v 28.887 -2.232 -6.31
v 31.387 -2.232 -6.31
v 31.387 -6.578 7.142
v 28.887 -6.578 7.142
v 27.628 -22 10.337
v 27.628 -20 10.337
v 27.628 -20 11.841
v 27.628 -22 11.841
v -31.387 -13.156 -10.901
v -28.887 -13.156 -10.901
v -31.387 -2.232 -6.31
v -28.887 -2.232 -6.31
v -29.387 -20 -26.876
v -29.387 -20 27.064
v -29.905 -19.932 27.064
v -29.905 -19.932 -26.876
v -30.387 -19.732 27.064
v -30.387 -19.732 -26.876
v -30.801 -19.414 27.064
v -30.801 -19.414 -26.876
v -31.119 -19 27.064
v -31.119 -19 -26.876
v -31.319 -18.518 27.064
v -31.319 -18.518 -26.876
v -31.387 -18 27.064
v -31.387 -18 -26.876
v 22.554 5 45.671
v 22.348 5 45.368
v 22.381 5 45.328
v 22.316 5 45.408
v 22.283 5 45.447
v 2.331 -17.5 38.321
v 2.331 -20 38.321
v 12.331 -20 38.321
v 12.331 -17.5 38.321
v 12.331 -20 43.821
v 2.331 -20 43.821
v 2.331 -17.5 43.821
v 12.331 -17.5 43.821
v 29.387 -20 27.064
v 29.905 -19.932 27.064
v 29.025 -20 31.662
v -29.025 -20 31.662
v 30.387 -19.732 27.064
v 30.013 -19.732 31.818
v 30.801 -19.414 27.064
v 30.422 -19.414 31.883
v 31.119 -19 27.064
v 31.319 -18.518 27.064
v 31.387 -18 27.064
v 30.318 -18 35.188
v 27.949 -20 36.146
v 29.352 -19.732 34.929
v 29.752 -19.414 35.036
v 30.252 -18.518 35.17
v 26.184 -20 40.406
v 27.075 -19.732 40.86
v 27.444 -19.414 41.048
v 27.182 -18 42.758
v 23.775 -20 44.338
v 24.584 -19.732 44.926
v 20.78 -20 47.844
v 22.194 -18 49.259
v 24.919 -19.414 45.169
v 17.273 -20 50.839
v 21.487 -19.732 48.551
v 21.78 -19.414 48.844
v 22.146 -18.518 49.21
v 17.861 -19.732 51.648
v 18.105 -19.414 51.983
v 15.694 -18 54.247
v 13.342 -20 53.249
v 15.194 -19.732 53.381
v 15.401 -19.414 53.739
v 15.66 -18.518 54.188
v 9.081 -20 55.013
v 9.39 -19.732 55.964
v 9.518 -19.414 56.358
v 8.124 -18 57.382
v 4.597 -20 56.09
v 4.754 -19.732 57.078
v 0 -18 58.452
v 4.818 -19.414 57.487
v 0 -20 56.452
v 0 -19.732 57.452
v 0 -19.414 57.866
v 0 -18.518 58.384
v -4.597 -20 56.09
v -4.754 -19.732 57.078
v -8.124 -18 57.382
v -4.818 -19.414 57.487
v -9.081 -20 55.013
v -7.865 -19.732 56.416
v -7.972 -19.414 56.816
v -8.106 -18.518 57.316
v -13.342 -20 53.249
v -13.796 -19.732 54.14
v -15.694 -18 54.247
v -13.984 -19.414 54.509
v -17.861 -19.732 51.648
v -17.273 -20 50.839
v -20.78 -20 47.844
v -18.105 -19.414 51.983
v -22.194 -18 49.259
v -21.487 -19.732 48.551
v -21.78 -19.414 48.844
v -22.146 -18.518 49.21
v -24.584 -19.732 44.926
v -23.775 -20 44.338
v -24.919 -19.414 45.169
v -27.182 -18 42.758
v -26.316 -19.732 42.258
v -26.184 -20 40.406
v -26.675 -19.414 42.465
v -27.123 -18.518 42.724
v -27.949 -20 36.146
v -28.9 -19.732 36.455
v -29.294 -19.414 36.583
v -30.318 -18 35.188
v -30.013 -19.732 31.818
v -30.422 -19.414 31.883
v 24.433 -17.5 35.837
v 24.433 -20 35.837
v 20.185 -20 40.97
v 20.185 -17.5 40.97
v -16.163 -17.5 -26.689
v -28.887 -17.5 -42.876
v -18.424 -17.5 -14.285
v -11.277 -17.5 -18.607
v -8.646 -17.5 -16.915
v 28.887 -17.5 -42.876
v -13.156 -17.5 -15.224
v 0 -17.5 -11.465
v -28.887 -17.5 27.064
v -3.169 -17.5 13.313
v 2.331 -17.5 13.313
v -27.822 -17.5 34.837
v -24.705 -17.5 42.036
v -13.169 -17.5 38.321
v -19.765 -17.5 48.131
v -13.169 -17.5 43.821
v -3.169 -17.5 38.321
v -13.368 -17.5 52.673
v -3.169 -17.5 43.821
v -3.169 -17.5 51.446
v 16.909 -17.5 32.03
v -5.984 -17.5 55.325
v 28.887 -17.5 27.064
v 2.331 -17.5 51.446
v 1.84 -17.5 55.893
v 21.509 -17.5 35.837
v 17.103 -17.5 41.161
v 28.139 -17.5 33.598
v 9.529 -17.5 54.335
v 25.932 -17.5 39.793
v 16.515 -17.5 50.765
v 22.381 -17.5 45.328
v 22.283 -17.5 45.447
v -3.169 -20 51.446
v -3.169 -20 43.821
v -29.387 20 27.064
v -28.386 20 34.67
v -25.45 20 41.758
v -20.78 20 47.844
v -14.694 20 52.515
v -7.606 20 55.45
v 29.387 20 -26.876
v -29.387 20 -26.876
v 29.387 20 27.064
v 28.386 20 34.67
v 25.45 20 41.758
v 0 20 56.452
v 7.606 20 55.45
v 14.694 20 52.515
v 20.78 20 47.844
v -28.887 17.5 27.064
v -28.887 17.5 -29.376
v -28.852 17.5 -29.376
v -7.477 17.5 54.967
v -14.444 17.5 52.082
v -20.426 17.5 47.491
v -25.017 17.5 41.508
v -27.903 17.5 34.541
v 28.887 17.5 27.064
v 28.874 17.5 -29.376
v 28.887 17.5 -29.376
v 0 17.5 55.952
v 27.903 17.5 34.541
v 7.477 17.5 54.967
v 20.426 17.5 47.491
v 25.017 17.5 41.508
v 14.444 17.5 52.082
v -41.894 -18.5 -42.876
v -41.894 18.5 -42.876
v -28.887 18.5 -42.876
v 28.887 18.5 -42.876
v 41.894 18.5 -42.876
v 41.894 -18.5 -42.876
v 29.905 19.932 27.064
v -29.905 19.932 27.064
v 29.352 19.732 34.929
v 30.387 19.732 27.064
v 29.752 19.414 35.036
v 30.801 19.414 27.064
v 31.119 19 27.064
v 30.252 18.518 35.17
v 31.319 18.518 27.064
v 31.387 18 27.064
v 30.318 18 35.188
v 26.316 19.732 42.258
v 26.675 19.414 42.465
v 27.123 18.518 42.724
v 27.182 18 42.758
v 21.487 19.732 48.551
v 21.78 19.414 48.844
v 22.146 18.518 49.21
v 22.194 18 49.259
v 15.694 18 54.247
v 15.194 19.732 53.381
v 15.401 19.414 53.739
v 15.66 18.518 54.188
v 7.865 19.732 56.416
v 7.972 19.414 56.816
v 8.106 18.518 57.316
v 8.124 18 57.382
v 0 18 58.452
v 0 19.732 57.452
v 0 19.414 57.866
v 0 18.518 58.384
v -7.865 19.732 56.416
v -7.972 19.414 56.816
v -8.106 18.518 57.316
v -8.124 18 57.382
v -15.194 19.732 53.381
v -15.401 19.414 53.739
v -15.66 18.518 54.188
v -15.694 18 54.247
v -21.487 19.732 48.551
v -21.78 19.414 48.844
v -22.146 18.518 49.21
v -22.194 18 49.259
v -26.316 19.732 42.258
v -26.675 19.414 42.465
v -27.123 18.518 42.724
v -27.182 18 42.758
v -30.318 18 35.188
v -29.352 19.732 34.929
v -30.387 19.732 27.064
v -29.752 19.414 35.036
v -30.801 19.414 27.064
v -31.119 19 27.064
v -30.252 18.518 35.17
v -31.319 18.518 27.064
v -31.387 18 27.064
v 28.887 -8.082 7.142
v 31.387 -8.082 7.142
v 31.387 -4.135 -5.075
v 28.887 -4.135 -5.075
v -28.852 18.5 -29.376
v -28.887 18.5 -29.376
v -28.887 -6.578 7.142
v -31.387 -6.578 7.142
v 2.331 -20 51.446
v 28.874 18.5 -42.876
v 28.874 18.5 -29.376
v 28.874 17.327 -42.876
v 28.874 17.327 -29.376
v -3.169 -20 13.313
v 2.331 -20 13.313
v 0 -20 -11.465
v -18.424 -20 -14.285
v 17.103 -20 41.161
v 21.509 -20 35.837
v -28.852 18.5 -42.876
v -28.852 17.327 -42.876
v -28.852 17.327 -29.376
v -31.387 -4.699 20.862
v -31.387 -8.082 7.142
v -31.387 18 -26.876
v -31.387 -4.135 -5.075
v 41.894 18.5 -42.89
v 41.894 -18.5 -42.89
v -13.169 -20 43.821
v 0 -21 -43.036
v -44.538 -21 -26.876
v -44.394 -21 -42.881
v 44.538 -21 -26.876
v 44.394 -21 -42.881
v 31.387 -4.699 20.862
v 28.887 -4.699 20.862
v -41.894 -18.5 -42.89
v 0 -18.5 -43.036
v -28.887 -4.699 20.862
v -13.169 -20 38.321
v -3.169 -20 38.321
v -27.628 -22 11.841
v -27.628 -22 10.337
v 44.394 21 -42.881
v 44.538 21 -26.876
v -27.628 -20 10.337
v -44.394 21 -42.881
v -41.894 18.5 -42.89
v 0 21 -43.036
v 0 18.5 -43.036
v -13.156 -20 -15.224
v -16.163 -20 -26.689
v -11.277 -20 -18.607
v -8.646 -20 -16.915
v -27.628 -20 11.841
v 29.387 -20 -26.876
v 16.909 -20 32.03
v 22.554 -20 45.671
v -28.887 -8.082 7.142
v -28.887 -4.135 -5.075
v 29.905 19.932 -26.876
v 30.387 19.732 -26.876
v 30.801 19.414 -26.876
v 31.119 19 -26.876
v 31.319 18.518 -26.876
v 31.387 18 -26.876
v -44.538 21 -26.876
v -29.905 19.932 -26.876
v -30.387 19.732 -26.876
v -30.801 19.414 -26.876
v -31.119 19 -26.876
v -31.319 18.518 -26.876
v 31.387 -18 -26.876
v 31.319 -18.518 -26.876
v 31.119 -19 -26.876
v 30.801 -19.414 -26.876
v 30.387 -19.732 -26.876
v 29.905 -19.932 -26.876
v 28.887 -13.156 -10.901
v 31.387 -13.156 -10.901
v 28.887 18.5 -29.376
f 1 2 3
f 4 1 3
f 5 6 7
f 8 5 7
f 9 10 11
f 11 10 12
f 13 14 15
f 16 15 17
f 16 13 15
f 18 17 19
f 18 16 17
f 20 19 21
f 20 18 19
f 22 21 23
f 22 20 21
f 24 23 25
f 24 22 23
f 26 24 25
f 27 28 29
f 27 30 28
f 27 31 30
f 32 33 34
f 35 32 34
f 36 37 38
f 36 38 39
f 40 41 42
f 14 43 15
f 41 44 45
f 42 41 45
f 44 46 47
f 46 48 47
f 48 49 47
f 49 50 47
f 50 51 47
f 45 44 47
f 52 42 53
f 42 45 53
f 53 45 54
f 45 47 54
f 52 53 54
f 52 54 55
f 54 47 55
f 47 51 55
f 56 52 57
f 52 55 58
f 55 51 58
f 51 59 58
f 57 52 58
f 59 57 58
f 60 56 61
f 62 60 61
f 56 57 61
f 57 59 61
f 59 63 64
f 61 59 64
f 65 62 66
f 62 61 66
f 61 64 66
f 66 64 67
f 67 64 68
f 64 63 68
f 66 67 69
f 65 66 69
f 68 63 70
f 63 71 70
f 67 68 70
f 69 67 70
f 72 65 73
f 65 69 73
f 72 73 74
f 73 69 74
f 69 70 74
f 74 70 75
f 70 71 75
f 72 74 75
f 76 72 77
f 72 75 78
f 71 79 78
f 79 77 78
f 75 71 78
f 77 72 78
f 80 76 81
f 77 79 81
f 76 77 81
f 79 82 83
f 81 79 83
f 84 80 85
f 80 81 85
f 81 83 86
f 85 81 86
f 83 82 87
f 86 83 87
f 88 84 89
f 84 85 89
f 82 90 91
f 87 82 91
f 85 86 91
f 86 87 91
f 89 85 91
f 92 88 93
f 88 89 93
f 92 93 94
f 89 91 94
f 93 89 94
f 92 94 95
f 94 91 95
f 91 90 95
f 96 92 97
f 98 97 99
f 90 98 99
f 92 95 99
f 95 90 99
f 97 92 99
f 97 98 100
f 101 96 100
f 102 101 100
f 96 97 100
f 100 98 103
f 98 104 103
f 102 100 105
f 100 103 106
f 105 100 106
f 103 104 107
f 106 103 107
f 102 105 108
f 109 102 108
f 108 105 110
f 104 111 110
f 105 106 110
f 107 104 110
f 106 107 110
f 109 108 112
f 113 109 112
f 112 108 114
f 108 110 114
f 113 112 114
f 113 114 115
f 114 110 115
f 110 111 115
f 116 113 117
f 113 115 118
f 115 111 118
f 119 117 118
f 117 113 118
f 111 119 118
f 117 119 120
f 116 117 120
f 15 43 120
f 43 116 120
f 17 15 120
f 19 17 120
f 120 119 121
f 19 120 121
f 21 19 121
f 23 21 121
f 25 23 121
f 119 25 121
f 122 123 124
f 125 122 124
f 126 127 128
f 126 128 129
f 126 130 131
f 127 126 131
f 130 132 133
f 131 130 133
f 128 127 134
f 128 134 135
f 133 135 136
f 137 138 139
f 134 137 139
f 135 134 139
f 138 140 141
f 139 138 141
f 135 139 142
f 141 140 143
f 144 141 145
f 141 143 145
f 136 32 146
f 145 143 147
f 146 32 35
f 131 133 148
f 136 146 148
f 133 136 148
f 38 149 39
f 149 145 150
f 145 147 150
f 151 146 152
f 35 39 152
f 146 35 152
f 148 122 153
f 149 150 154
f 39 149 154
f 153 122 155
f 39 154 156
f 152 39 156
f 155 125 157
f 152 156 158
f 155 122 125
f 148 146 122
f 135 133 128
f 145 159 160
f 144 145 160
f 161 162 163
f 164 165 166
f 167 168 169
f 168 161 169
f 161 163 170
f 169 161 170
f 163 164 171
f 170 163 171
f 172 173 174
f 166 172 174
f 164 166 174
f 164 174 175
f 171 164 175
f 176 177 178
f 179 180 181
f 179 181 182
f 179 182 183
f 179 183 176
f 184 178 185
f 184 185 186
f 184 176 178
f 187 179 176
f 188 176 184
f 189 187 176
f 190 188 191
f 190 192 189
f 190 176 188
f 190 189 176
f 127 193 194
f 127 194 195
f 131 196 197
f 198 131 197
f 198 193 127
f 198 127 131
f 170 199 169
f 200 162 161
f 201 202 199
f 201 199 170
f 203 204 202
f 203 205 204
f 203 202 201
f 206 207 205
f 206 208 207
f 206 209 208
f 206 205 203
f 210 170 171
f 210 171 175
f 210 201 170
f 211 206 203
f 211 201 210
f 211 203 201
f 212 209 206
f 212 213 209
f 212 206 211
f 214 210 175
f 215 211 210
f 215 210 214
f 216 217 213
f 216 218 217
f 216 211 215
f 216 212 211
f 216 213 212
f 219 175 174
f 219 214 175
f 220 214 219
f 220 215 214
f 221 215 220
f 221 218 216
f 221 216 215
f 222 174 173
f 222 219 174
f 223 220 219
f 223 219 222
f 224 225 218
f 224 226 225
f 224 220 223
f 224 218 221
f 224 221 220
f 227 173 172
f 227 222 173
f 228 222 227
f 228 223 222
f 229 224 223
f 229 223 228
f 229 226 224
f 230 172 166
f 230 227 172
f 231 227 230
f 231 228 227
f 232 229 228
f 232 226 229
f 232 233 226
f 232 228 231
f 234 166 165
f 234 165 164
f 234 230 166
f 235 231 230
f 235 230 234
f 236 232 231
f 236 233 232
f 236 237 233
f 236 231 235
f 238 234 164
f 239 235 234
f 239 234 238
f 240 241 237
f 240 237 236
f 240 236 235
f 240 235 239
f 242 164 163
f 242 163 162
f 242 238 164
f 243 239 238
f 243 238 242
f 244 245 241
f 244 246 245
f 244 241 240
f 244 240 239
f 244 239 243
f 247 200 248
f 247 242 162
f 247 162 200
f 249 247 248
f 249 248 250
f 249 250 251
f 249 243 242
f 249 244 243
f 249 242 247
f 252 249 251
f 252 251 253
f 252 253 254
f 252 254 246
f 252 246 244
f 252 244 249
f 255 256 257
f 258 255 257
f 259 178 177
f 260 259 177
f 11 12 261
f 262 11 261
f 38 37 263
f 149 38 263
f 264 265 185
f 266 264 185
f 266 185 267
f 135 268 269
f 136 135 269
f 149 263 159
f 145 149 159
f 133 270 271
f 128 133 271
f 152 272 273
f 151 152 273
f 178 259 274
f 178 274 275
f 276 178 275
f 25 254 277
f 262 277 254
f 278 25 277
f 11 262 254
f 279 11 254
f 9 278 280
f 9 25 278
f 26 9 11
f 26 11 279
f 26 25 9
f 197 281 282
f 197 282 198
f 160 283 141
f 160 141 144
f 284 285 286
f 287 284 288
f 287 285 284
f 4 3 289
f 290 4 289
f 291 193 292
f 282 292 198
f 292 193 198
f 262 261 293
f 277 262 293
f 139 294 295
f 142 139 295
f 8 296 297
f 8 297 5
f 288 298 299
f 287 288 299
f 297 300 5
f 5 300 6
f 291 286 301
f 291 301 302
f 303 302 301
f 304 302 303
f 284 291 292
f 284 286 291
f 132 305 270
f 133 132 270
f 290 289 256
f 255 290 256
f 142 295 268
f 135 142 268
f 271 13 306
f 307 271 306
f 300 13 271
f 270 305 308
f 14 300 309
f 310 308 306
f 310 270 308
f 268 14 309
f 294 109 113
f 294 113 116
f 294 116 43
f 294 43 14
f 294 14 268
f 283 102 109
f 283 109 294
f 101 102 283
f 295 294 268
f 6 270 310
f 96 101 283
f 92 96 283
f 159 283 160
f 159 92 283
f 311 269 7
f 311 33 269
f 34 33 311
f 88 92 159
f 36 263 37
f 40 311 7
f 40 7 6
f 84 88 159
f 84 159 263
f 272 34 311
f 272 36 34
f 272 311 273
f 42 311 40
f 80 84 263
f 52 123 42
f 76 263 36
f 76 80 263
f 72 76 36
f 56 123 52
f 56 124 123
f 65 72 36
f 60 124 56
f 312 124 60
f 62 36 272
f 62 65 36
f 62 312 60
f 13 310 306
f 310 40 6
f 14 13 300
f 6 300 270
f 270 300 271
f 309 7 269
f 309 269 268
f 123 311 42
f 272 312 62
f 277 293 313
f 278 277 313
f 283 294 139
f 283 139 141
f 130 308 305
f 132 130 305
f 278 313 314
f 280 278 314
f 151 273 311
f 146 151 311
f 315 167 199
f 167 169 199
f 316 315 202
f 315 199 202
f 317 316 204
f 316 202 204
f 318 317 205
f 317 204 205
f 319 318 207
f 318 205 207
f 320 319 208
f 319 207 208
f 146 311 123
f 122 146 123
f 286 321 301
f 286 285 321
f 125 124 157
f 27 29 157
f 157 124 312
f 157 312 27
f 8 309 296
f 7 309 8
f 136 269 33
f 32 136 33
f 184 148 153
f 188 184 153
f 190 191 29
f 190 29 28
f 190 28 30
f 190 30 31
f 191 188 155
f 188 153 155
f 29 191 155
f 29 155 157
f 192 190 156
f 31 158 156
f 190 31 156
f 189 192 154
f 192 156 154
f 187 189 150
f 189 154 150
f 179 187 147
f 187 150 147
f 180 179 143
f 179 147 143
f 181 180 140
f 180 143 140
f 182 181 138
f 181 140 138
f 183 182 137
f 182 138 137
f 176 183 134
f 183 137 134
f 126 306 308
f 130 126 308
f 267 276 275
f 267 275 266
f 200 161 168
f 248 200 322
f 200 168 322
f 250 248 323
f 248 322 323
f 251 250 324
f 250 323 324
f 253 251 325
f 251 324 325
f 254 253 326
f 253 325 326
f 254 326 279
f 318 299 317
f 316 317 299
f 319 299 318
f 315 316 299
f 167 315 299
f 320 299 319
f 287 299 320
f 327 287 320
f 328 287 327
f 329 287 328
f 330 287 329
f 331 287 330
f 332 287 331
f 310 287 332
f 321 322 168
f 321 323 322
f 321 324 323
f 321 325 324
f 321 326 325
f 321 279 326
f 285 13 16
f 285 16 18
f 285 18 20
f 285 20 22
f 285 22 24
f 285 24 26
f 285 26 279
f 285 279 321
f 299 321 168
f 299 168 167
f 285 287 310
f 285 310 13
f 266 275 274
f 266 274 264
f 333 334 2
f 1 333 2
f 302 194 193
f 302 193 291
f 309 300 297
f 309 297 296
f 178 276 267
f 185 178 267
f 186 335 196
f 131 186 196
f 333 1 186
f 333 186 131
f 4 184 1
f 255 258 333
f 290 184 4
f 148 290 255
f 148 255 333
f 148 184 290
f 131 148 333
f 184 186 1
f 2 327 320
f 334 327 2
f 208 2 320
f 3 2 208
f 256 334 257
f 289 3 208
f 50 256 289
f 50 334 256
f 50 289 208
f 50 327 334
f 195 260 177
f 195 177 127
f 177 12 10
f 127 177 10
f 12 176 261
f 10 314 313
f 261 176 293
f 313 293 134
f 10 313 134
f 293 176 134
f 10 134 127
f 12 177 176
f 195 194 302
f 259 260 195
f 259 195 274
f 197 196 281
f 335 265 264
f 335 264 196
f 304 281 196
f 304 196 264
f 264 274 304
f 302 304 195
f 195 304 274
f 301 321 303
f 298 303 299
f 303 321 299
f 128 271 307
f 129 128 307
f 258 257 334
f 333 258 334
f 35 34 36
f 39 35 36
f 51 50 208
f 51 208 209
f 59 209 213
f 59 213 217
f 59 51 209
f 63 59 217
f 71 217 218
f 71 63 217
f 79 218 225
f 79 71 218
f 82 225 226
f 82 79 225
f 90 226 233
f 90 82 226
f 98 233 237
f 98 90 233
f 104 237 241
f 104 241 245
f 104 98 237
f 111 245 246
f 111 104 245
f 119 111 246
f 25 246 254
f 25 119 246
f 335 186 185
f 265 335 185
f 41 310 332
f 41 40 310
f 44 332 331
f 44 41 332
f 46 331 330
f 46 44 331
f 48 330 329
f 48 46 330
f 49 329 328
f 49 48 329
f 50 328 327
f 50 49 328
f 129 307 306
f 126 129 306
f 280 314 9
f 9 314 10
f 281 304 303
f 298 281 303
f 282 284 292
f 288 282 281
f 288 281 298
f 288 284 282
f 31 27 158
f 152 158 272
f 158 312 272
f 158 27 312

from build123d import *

# Parameters (mm, degrees)
F1_DEPTH  = 20
F3_DEPTH  = 21
F4_T      = -2.5
F6_W      = 10
F6_H      = 5.5
F7_DEPTH  = 25
F8_W      = 55.2565678954
F8_H      = 1.5035793185
F9_DEPTH  = 2
F10_R     = 2
F12_DEPTH = 70
F14_DEPTH = 25
F16_DEPTH = 25
F17_W     = 13.128624599
F17_H     = 37
F18_DEPTH = 13.5
F19_W     = 13.128624711
F19_H     = 37
F20_DEPTH = 13.5
F21_W     = 57.774464488
F21_H     = 1
F21_W_2   = 57.7263757586
F21_H_2   = 1.2739617378
F22_DEPTH = 13.5


with BuildPart() as f1:
    # F0 (on Front) → F1 (new body, symmetric)
    with BuildSketch(Plane.XZ):
        with BuildLine():
            Line((31.387232244, -27.2523891181), (31.387232244, 27.0644389093))
            ThreePointArc((31.387232244, 27.0644389093), (0, 58.4516711533), (-31.387232244, 27.0644389093))
            Line((-31.387232244, 27.0644389093), (-31.387232244, -27.2523891181))
            Line((-31.387232244, -27.2523891181), (31.387232244, -27.2523891181))
        make_face()
    extrude(amount=F1_DEPTH, both=True)

    # F2 (on Front) → F3 (join, symmetric)
    with BuildSketch(Plane.XZ):
        Polygon((31.1992858725, -26.8764924258), (-31.1992857605, -26.8764924258), (-44.5384809197, -26.8764924258), (-44.3942922286, -42.8813642573), (5.62e-08, -43.0360519628), (44.3942923407, -42.8813642573), (44.5384810317, -26.8764924258), align=None)
    extrude(amount=F3_DEPTH, both=True)

    # F4
    f4_openings = [f1.faces().sort_by_distance(p)[0] for p in [
        (-22.197146, 0, -42.958708),
        (22.197146, 0, -42.958708),
    ]]
    offset(amount=F4_T, openings=f4_openings, kind=Kind.INTERSECTION)

    # F6 (on face) → F7 (cut)
    with BuildSketch(Plane.XZ.offset(20)):
        Polygon((2.3308762088, 51.4463313338), (-3.1691237912, 51.4463313338), (-3.1691237912, 43.8206121624), (-3.1691237912, 38.3206121624), (-3.1691237912, 13.312992971), (2.3308762088, 13.312992971), (2.3308762088, 38.3206121624), (2.3308762088, 43.8206121624), align=None)
        with Locations((-8.1691237912, 41.0706121624)):
            Rectangle(F6_W, F6_H)
        with Locations((7.3308762088, 41.0706121624)):
            Rectangle(F6_W, F6_H)
    extrude(amount=-F7_DEPTH, mode=Mode.SUBTRACT)

    # F8 (on face) → F9 (join)
    with BuildSketch(Plane.XZ.offset(20)):
        with Locations((0, 11.088903062)):
            Rectangle(F8_W, F8_H)
    extrude(amount=F9_DEPTH)

    # F10
    f10_edges = [f1.edges().sort_by_distance(p)[0] for p in [
        (0, -20, 58.451671),
        (0, 20, 58.451671),
    ]]
    fillet(f10_edges, radius=F10_R)

    # F11 (on face) → F12 (cut)
    with BuildSketch(Plane.YZ.offset(31.387232244)):
        Polygon((-4.1348445229, -5.0745825283), (-13.156324625, -10.9009547159), (-2.2320076807, -6.3103797534), (-6.5781623125, 7.1420050226), (-4.698687233, 20.8621732891), (-8.081741631, 7.1420050226), align=None)
    extrude(amount=-F12_DEPTH, mode=Mode.SUBTRACT)

    # F13 (on face) → F14 (cut)
    with BuildSketch(Plane.XZ.offset(20)):
        Polygon((-11.2768495455, -18.6068024486), (-16.1634851247, -26.6885459423), (-8.6455848068, -16.915274784), (-13.156324625, -15.2237480506), (0, -11.4647978917), (-18.4239908566, -14.2852751634), align=None)
    extrude(amount=-F14_DEPTH, mode=Mode.SUBTRACT)

    # F15 (on face) → F16 (cut)
    with BuildSketch(Plane.XZ.offset(20)):
        Polygon((20.1853319103, 40.9697728612), (22.5537028164, 45.6712394953), (17.1032212675, 41.1605015397), (21.5089086938, 35.8369561988), (16.9085077893, 32.0297324177), (24.4331751019, 35.8369561988), align=None)
    extrude(amount=-F16_DEPTH, mode=Mode.SUBTRACT)

    # F17 (on face) → F18 (join)
    with BuildSketch(Plane(origin=(0, 0, -29.3764924258), x_dir=(1, 0, 0), z_dir=(0, 0, -1))):
        with Locations((-35.4515445435, 0)):
            Rectangle(F17_W, F17_H)
    extrude(amount=F18_DEPTH)

    # F19 (on face) → F20 (join)
    with BuildSketch(Plane(origin=(0, 0, -29.3764924258), x_dir=(1, 0, 0), z_dir=(0, 0, -1))):
        with Locations((35.4515445995, 0)):
            Rectangle(F19_W, F19_H)
    extrude(amount=F20_DEPTH)

    # F21 (on face) → F22 (join)
    with BuildSketch(Plane(origin=(0, 0, -29.3764924258), x_dir=(1, 0, 0), z_dir=(0, 0, -1))):
        with Locations((0, 18)):
            Rectangle(F21_W, F21_H)
        with Locations((0.0108480453, -17.9641498253)):
            Rectangle(F21_W_2, F21_H_2)
    extrude(amount=F22_DEPTH)


solid = f1.part
